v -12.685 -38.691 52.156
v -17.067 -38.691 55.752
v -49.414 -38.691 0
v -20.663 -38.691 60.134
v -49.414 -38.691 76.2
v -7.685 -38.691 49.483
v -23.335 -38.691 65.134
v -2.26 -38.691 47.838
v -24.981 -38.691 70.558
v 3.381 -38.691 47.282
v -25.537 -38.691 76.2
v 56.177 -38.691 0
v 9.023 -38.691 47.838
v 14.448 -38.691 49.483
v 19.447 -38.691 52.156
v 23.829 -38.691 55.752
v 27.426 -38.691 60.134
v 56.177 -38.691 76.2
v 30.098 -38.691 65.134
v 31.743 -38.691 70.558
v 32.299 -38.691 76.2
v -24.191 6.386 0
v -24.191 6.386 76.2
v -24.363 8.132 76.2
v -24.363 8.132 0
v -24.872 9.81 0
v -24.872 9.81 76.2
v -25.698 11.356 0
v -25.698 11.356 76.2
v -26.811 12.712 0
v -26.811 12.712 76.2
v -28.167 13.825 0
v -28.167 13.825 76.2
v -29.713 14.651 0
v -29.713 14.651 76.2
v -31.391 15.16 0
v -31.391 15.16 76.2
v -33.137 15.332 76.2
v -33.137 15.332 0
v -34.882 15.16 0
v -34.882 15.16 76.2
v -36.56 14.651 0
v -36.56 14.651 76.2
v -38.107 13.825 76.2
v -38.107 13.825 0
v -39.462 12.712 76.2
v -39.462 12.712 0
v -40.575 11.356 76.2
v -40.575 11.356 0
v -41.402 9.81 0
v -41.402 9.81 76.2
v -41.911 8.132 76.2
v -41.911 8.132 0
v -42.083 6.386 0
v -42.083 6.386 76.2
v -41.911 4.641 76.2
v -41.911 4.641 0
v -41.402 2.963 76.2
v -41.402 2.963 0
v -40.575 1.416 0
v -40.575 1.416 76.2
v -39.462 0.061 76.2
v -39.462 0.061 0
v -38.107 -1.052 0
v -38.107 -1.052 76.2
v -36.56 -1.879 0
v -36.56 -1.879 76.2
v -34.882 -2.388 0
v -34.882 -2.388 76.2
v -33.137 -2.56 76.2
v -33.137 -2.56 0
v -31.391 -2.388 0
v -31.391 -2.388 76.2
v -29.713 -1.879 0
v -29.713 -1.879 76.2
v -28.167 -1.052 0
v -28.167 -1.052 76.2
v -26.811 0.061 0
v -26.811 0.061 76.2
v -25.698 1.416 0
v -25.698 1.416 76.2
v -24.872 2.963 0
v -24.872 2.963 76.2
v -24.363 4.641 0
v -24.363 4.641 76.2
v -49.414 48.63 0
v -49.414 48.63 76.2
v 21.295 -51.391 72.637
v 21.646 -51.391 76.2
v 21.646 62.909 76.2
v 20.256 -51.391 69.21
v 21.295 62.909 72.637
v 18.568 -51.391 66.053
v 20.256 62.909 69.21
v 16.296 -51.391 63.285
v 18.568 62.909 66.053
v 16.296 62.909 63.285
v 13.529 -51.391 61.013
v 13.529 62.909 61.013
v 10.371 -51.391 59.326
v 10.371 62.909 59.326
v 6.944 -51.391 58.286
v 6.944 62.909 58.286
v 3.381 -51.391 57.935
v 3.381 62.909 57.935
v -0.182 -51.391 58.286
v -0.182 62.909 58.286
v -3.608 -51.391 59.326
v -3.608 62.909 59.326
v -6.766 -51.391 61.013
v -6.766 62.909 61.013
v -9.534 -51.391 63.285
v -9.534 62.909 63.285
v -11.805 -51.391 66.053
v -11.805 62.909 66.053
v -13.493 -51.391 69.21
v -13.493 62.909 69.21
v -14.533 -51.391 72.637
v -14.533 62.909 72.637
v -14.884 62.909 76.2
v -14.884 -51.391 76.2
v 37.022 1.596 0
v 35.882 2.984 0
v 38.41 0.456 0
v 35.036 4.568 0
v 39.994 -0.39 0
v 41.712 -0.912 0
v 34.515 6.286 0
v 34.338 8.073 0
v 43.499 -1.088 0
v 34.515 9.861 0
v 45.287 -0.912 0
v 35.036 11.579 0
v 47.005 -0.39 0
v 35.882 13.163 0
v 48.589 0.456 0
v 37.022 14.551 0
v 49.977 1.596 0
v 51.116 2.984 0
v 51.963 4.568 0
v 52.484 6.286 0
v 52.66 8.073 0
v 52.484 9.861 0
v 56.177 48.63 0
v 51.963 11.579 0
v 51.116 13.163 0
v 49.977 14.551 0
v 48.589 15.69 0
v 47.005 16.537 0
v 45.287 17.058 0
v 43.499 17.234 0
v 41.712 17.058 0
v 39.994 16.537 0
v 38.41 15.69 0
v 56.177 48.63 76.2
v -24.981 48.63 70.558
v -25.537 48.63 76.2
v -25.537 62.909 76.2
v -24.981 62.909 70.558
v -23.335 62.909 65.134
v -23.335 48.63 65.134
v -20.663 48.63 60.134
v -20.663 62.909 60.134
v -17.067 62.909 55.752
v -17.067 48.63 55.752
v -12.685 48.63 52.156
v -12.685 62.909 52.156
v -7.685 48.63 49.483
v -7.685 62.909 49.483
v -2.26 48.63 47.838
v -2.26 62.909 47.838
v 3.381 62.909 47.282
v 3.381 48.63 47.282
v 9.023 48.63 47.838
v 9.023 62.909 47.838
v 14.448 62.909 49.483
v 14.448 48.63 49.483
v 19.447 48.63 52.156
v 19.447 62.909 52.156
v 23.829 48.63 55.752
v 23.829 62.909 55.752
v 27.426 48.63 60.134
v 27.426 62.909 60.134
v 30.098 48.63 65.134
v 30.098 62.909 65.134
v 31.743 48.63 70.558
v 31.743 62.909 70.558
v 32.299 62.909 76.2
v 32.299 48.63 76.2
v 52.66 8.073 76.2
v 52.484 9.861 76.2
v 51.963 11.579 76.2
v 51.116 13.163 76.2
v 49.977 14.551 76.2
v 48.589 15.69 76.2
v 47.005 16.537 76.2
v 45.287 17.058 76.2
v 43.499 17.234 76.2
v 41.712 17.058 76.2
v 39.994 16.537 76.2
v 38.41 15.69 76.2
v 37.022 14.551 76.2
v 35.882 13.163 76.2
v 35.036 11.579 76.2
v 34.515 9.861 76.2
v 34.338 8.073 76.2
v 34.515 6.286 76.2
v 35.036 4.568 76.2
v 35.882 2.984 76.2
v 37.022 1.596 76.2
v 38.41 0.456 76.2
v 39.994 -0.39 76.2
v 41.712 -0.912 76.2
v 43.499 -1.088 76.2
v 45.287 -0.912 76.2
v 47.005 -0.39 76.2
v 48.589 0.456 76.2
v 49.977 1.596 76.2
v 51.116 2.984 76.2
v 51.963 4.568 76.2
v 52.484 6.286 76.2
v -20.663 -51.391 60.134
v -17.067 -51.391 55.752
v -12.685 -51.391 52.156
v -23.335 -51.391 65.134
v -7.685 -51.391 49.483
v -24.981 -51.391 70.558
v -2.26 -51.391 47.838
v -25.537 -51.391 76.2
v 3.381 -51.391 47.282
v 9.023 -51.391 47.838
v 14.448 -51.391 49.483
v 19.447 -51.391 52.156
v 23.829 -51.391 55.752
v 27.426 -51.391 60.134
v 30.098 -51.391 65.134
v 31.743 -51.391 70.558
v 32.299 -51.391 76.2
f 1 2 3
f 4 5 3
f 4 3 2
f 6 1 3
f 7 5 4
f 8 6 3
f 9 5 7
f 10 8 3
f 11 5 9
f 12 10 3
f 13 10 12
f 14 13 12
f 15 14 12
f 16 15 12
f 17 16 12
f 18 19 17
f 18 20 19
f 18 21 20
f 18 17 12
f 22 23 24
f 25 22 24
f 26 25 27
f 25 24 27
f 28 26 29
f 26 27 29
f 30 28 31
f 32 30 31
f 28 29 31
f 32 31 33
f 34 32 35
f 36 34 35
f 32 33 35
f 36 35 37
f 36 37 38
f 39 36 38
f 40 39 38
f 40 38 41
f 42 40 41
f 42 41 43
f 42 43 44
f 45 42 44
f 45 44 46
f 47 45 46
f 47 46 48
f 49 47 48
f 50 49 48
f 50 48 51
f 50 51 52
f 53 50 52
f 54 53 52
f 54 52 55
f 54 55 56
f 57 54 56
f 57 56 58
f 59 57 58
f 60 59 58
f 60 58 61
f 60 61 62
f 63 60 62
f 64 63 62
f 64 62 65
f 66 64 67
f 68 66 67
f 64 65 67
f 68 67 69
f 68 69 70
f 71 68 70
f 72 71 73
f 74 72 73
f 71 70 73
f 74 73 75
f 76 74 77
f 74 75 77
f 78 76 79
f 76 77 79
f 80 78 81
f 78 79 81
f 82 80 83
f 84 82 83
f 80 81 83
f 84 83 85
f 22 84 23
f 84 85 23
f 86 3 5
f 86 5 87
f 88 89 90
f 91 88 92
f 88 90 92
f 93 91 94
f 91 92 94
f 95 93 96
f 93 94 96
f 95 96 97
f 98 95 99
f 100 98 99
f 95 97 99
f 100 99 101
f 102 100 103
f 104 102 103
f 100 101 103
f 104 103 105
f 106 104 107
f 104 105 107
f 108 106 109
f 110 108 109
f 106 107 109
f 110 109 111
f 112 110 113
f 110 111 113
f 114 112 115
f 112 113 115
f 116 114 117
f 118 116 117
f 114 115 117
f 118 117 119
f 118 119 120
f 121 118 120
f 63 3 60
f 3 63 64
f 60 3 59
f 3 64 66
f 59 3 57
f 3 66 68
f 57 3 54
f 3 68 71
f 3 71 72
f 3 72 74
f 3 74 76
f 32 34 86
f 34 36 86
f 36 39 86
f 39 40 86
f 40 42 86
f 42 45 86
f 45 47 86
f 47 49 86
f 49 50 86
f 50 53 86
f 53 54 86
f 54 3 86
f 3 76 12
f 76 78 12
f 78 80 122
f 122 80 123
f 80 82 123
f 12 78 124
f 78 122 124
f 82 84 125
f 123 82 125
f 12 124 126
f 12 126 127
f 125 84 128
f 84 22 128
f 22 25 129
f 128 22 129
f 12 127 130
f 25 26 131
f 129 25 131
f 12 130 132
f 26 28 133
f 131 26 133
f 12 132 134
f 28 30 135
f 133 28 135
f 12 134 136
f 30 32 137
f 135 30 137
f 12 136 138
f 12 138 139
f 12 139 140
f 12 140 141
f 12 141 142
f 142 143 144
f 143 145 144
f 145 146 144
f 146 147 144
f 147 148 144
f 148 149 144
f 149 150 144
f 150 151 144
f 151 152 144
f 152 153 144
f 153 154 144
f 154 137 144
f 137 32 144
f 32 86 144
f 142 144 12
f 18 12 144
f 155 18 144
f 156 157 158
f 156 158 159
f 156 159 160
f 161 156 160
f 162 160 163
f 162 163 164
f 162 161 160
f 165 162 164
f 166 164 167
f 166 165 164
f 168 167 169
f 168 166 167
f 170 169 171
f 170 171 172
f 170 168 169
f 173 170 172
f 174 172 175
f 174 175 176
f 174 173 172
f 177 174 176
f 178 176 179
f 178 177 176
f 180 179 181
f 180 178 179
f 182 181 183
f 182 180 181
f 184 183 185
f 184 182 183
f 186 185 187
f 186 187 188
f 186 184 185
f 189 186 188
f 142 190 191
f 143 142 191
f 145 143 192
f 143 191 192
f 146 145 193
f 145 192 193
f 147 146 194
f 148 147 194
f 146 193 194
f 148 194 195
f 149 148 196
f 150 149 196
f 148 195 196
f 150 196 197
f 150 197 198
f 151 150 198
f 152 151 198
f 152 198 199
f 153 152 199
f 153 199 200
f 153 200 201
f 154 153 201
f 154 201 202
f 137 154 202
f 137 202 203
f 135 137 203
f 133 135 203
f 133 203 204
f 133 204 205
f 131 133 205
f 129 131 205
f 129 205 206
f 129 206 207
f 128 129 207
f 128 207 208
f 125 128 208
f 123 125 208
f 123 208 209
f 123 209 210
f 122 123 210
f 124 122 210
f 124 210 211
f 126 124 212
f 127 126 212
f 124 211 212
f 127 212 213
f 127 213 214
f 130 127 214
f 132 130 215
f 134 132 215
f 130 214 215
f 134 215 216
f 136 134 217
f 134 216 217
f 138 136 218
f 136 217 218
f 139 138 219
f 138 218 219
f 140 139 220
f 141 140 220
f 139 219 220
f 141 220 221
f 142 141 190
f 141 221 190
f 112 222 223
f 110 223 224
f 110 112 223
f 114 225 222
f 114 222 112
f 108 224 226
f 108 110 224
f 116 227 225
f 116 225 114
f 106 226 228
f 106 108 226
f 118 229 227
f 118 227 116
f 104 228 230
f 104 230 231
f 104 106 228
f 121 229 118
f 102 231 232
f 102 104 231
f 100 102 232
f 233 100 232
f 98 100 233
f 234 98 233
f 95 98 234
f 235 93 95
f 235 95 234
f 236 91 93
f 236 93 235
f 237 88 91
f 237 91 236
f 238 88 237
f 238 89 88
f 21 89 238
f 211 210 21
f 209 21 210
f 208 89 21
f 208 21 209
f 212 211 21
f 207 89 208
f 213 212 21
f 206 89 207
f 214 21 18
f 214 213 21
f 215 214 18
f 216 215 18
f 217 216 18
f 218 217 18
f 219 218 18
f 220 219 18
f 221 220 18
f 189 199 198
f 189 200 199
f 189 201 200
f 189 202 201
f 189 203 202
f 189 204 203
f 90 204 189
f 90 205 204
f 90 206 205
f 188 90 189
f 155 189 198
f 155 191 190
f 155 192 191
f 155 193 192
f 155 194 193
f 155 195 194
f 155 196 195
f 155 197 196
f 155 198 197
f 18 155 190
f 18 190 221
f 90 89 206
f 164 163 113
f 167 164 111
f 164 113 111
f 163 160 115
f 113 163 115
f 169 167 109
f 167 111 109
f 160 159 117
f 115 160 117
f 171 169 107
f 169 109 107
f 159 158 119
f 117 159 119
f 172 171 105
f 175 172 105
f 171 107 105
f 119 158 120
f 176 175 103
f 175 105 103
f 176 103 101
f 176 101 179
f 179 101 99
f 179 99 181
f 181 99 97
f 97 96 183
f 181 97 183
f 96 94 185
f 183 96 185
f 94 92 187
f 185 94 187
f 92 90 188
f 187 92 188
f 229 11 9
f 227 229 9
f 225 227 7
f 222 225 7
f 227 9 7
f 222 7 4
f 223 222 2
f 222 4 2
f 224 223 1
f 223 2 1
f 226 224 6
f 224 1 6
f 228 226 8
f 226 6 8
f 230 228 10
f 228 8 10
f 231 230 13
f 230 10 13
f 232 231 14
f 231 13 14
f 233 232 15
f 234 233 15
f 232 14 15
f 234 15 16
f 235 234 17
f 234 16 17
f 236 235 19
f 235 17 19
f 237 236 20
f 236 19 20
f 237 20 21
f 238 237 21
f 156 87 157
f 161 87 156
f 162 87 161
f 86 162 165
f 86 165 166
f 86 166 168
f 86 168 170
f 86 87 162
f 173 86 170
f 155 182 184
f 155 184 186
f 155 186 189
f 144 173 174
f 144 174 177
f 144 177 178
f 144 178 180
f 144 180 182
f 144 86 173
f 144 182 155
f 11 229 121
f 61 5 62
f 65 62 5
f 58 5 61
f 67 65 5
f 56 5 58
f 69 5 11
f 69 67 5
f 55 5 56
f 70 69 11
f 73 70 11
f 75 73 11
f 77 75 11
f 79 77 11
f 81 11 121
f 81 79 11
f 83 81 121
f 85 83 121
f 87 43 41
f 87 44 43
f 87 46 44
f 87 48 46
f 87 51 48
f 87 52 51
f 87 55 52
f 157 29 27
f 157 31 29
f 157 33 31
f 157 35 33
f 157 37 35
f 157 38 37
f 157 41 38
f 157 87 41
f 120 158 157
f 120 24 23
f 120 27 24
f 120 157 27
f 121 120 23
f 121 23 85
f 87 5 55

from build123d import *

# Parameters (mm, degrees)
F0_W     = 105.5908799171
F0_H     = 87.321691215
F1_DEPTH = 76.2
F3_DEPTH = 101.6
F4_DEPTH = 12.7
F5_DEPTH = 127
F6_R     = 8.9460405917
F7_DEPTH = 101.6
F6_R_2   = 9.1609397995
F8_DEPTH = 127


with BuildPart() as f1:
    # F0 (on Top) → F1 (new body)
    with BuildSketch(Plane.XY):
        with Locations((3.3811926842, 4.9695521593)):
            Rectangle(F0_W, F0_H)
    extrude(amount=F1_DEPTH)

    # F2 (on face) → F3 (join)
    with BuildSketch(Plane.XZ.offset(38.6912934482)):
        with BuildLine():
            ThreePointArc((-14.8835639872, 76.2), (3.3811926842, 57.9352433286), (21.6459493555, 76.2))
            Line((21.6459493555, 76.2), (-14.8835639872, 76.2))
        make_face()
        with BuildLine():
            ThreePointArc((-25.5366911298, 76.2), (3.3811926842, 47.282116186), (32.2990764981, 76.2))
            Line((32.2990764981, 76.2), (21.6459493555, 76.2))
            ThreePointArc((21.6459493555, 76.2), (3.3811926842, 57.9352433286), (-14.8835639872, 76.2))
            Line((-14.8835639872, 76.2), (-25.5366911298, 76.2))
        make_face()
    extrude(amount=-F3_DEPTH)

    # F2 (on face) → F4 (join)
    with BuildSketch(Plane.XZ.offset(38.6912934482)):
        with BuildLine():
            ThreePointArc((-25.5366911298, 76.2), (3.3811926842, 47.282116186), (32.2990764981, 76.2))
            Line((32.2990764981, 76.2), (21.6459493555, 76.2))
            ThreePointArc((21.6459493555, 76.2), (3.3811926842, 57.9352433286), (-14.8835639872, 76.2))
            Line((-14.8835639872, 76.2), (-25.5366911298, 76.2))
        make_face()
    extrude(amount=F4_DEPTH)

    # F5 (cut): a face of the model
    f5_faces = [f1.faces().sort_by_distance(p)[0] for p in [
        (3.3811926842, -38.6912934482, 68.4481965103),
    ]]
    extrude(f5_faces, amount=-F5_DEPTH, mode=Mode.SUBTRACT)

    # F6 (on face) → F7 (cut)
    with BuildSketch(Plane.XY.offset(76.2)):
        with Locations((-33.1366732717, 6.3863405958)):
            Circle(F6_R)
    extrude(amount=-F7_DEPTH, mode=Mode.SUBTRACT)

    # F6 (on face) → F8 (cut)
    with BuildSketch(Plane.XY.offset(76.2)):
        with Locations((43.499417603, 8.0732982606)):
            Circle(F6_R_2)
    extrude(amount=-F8_DEPTH, mode=Mode.SUBTRACT)


solid = f1.part
